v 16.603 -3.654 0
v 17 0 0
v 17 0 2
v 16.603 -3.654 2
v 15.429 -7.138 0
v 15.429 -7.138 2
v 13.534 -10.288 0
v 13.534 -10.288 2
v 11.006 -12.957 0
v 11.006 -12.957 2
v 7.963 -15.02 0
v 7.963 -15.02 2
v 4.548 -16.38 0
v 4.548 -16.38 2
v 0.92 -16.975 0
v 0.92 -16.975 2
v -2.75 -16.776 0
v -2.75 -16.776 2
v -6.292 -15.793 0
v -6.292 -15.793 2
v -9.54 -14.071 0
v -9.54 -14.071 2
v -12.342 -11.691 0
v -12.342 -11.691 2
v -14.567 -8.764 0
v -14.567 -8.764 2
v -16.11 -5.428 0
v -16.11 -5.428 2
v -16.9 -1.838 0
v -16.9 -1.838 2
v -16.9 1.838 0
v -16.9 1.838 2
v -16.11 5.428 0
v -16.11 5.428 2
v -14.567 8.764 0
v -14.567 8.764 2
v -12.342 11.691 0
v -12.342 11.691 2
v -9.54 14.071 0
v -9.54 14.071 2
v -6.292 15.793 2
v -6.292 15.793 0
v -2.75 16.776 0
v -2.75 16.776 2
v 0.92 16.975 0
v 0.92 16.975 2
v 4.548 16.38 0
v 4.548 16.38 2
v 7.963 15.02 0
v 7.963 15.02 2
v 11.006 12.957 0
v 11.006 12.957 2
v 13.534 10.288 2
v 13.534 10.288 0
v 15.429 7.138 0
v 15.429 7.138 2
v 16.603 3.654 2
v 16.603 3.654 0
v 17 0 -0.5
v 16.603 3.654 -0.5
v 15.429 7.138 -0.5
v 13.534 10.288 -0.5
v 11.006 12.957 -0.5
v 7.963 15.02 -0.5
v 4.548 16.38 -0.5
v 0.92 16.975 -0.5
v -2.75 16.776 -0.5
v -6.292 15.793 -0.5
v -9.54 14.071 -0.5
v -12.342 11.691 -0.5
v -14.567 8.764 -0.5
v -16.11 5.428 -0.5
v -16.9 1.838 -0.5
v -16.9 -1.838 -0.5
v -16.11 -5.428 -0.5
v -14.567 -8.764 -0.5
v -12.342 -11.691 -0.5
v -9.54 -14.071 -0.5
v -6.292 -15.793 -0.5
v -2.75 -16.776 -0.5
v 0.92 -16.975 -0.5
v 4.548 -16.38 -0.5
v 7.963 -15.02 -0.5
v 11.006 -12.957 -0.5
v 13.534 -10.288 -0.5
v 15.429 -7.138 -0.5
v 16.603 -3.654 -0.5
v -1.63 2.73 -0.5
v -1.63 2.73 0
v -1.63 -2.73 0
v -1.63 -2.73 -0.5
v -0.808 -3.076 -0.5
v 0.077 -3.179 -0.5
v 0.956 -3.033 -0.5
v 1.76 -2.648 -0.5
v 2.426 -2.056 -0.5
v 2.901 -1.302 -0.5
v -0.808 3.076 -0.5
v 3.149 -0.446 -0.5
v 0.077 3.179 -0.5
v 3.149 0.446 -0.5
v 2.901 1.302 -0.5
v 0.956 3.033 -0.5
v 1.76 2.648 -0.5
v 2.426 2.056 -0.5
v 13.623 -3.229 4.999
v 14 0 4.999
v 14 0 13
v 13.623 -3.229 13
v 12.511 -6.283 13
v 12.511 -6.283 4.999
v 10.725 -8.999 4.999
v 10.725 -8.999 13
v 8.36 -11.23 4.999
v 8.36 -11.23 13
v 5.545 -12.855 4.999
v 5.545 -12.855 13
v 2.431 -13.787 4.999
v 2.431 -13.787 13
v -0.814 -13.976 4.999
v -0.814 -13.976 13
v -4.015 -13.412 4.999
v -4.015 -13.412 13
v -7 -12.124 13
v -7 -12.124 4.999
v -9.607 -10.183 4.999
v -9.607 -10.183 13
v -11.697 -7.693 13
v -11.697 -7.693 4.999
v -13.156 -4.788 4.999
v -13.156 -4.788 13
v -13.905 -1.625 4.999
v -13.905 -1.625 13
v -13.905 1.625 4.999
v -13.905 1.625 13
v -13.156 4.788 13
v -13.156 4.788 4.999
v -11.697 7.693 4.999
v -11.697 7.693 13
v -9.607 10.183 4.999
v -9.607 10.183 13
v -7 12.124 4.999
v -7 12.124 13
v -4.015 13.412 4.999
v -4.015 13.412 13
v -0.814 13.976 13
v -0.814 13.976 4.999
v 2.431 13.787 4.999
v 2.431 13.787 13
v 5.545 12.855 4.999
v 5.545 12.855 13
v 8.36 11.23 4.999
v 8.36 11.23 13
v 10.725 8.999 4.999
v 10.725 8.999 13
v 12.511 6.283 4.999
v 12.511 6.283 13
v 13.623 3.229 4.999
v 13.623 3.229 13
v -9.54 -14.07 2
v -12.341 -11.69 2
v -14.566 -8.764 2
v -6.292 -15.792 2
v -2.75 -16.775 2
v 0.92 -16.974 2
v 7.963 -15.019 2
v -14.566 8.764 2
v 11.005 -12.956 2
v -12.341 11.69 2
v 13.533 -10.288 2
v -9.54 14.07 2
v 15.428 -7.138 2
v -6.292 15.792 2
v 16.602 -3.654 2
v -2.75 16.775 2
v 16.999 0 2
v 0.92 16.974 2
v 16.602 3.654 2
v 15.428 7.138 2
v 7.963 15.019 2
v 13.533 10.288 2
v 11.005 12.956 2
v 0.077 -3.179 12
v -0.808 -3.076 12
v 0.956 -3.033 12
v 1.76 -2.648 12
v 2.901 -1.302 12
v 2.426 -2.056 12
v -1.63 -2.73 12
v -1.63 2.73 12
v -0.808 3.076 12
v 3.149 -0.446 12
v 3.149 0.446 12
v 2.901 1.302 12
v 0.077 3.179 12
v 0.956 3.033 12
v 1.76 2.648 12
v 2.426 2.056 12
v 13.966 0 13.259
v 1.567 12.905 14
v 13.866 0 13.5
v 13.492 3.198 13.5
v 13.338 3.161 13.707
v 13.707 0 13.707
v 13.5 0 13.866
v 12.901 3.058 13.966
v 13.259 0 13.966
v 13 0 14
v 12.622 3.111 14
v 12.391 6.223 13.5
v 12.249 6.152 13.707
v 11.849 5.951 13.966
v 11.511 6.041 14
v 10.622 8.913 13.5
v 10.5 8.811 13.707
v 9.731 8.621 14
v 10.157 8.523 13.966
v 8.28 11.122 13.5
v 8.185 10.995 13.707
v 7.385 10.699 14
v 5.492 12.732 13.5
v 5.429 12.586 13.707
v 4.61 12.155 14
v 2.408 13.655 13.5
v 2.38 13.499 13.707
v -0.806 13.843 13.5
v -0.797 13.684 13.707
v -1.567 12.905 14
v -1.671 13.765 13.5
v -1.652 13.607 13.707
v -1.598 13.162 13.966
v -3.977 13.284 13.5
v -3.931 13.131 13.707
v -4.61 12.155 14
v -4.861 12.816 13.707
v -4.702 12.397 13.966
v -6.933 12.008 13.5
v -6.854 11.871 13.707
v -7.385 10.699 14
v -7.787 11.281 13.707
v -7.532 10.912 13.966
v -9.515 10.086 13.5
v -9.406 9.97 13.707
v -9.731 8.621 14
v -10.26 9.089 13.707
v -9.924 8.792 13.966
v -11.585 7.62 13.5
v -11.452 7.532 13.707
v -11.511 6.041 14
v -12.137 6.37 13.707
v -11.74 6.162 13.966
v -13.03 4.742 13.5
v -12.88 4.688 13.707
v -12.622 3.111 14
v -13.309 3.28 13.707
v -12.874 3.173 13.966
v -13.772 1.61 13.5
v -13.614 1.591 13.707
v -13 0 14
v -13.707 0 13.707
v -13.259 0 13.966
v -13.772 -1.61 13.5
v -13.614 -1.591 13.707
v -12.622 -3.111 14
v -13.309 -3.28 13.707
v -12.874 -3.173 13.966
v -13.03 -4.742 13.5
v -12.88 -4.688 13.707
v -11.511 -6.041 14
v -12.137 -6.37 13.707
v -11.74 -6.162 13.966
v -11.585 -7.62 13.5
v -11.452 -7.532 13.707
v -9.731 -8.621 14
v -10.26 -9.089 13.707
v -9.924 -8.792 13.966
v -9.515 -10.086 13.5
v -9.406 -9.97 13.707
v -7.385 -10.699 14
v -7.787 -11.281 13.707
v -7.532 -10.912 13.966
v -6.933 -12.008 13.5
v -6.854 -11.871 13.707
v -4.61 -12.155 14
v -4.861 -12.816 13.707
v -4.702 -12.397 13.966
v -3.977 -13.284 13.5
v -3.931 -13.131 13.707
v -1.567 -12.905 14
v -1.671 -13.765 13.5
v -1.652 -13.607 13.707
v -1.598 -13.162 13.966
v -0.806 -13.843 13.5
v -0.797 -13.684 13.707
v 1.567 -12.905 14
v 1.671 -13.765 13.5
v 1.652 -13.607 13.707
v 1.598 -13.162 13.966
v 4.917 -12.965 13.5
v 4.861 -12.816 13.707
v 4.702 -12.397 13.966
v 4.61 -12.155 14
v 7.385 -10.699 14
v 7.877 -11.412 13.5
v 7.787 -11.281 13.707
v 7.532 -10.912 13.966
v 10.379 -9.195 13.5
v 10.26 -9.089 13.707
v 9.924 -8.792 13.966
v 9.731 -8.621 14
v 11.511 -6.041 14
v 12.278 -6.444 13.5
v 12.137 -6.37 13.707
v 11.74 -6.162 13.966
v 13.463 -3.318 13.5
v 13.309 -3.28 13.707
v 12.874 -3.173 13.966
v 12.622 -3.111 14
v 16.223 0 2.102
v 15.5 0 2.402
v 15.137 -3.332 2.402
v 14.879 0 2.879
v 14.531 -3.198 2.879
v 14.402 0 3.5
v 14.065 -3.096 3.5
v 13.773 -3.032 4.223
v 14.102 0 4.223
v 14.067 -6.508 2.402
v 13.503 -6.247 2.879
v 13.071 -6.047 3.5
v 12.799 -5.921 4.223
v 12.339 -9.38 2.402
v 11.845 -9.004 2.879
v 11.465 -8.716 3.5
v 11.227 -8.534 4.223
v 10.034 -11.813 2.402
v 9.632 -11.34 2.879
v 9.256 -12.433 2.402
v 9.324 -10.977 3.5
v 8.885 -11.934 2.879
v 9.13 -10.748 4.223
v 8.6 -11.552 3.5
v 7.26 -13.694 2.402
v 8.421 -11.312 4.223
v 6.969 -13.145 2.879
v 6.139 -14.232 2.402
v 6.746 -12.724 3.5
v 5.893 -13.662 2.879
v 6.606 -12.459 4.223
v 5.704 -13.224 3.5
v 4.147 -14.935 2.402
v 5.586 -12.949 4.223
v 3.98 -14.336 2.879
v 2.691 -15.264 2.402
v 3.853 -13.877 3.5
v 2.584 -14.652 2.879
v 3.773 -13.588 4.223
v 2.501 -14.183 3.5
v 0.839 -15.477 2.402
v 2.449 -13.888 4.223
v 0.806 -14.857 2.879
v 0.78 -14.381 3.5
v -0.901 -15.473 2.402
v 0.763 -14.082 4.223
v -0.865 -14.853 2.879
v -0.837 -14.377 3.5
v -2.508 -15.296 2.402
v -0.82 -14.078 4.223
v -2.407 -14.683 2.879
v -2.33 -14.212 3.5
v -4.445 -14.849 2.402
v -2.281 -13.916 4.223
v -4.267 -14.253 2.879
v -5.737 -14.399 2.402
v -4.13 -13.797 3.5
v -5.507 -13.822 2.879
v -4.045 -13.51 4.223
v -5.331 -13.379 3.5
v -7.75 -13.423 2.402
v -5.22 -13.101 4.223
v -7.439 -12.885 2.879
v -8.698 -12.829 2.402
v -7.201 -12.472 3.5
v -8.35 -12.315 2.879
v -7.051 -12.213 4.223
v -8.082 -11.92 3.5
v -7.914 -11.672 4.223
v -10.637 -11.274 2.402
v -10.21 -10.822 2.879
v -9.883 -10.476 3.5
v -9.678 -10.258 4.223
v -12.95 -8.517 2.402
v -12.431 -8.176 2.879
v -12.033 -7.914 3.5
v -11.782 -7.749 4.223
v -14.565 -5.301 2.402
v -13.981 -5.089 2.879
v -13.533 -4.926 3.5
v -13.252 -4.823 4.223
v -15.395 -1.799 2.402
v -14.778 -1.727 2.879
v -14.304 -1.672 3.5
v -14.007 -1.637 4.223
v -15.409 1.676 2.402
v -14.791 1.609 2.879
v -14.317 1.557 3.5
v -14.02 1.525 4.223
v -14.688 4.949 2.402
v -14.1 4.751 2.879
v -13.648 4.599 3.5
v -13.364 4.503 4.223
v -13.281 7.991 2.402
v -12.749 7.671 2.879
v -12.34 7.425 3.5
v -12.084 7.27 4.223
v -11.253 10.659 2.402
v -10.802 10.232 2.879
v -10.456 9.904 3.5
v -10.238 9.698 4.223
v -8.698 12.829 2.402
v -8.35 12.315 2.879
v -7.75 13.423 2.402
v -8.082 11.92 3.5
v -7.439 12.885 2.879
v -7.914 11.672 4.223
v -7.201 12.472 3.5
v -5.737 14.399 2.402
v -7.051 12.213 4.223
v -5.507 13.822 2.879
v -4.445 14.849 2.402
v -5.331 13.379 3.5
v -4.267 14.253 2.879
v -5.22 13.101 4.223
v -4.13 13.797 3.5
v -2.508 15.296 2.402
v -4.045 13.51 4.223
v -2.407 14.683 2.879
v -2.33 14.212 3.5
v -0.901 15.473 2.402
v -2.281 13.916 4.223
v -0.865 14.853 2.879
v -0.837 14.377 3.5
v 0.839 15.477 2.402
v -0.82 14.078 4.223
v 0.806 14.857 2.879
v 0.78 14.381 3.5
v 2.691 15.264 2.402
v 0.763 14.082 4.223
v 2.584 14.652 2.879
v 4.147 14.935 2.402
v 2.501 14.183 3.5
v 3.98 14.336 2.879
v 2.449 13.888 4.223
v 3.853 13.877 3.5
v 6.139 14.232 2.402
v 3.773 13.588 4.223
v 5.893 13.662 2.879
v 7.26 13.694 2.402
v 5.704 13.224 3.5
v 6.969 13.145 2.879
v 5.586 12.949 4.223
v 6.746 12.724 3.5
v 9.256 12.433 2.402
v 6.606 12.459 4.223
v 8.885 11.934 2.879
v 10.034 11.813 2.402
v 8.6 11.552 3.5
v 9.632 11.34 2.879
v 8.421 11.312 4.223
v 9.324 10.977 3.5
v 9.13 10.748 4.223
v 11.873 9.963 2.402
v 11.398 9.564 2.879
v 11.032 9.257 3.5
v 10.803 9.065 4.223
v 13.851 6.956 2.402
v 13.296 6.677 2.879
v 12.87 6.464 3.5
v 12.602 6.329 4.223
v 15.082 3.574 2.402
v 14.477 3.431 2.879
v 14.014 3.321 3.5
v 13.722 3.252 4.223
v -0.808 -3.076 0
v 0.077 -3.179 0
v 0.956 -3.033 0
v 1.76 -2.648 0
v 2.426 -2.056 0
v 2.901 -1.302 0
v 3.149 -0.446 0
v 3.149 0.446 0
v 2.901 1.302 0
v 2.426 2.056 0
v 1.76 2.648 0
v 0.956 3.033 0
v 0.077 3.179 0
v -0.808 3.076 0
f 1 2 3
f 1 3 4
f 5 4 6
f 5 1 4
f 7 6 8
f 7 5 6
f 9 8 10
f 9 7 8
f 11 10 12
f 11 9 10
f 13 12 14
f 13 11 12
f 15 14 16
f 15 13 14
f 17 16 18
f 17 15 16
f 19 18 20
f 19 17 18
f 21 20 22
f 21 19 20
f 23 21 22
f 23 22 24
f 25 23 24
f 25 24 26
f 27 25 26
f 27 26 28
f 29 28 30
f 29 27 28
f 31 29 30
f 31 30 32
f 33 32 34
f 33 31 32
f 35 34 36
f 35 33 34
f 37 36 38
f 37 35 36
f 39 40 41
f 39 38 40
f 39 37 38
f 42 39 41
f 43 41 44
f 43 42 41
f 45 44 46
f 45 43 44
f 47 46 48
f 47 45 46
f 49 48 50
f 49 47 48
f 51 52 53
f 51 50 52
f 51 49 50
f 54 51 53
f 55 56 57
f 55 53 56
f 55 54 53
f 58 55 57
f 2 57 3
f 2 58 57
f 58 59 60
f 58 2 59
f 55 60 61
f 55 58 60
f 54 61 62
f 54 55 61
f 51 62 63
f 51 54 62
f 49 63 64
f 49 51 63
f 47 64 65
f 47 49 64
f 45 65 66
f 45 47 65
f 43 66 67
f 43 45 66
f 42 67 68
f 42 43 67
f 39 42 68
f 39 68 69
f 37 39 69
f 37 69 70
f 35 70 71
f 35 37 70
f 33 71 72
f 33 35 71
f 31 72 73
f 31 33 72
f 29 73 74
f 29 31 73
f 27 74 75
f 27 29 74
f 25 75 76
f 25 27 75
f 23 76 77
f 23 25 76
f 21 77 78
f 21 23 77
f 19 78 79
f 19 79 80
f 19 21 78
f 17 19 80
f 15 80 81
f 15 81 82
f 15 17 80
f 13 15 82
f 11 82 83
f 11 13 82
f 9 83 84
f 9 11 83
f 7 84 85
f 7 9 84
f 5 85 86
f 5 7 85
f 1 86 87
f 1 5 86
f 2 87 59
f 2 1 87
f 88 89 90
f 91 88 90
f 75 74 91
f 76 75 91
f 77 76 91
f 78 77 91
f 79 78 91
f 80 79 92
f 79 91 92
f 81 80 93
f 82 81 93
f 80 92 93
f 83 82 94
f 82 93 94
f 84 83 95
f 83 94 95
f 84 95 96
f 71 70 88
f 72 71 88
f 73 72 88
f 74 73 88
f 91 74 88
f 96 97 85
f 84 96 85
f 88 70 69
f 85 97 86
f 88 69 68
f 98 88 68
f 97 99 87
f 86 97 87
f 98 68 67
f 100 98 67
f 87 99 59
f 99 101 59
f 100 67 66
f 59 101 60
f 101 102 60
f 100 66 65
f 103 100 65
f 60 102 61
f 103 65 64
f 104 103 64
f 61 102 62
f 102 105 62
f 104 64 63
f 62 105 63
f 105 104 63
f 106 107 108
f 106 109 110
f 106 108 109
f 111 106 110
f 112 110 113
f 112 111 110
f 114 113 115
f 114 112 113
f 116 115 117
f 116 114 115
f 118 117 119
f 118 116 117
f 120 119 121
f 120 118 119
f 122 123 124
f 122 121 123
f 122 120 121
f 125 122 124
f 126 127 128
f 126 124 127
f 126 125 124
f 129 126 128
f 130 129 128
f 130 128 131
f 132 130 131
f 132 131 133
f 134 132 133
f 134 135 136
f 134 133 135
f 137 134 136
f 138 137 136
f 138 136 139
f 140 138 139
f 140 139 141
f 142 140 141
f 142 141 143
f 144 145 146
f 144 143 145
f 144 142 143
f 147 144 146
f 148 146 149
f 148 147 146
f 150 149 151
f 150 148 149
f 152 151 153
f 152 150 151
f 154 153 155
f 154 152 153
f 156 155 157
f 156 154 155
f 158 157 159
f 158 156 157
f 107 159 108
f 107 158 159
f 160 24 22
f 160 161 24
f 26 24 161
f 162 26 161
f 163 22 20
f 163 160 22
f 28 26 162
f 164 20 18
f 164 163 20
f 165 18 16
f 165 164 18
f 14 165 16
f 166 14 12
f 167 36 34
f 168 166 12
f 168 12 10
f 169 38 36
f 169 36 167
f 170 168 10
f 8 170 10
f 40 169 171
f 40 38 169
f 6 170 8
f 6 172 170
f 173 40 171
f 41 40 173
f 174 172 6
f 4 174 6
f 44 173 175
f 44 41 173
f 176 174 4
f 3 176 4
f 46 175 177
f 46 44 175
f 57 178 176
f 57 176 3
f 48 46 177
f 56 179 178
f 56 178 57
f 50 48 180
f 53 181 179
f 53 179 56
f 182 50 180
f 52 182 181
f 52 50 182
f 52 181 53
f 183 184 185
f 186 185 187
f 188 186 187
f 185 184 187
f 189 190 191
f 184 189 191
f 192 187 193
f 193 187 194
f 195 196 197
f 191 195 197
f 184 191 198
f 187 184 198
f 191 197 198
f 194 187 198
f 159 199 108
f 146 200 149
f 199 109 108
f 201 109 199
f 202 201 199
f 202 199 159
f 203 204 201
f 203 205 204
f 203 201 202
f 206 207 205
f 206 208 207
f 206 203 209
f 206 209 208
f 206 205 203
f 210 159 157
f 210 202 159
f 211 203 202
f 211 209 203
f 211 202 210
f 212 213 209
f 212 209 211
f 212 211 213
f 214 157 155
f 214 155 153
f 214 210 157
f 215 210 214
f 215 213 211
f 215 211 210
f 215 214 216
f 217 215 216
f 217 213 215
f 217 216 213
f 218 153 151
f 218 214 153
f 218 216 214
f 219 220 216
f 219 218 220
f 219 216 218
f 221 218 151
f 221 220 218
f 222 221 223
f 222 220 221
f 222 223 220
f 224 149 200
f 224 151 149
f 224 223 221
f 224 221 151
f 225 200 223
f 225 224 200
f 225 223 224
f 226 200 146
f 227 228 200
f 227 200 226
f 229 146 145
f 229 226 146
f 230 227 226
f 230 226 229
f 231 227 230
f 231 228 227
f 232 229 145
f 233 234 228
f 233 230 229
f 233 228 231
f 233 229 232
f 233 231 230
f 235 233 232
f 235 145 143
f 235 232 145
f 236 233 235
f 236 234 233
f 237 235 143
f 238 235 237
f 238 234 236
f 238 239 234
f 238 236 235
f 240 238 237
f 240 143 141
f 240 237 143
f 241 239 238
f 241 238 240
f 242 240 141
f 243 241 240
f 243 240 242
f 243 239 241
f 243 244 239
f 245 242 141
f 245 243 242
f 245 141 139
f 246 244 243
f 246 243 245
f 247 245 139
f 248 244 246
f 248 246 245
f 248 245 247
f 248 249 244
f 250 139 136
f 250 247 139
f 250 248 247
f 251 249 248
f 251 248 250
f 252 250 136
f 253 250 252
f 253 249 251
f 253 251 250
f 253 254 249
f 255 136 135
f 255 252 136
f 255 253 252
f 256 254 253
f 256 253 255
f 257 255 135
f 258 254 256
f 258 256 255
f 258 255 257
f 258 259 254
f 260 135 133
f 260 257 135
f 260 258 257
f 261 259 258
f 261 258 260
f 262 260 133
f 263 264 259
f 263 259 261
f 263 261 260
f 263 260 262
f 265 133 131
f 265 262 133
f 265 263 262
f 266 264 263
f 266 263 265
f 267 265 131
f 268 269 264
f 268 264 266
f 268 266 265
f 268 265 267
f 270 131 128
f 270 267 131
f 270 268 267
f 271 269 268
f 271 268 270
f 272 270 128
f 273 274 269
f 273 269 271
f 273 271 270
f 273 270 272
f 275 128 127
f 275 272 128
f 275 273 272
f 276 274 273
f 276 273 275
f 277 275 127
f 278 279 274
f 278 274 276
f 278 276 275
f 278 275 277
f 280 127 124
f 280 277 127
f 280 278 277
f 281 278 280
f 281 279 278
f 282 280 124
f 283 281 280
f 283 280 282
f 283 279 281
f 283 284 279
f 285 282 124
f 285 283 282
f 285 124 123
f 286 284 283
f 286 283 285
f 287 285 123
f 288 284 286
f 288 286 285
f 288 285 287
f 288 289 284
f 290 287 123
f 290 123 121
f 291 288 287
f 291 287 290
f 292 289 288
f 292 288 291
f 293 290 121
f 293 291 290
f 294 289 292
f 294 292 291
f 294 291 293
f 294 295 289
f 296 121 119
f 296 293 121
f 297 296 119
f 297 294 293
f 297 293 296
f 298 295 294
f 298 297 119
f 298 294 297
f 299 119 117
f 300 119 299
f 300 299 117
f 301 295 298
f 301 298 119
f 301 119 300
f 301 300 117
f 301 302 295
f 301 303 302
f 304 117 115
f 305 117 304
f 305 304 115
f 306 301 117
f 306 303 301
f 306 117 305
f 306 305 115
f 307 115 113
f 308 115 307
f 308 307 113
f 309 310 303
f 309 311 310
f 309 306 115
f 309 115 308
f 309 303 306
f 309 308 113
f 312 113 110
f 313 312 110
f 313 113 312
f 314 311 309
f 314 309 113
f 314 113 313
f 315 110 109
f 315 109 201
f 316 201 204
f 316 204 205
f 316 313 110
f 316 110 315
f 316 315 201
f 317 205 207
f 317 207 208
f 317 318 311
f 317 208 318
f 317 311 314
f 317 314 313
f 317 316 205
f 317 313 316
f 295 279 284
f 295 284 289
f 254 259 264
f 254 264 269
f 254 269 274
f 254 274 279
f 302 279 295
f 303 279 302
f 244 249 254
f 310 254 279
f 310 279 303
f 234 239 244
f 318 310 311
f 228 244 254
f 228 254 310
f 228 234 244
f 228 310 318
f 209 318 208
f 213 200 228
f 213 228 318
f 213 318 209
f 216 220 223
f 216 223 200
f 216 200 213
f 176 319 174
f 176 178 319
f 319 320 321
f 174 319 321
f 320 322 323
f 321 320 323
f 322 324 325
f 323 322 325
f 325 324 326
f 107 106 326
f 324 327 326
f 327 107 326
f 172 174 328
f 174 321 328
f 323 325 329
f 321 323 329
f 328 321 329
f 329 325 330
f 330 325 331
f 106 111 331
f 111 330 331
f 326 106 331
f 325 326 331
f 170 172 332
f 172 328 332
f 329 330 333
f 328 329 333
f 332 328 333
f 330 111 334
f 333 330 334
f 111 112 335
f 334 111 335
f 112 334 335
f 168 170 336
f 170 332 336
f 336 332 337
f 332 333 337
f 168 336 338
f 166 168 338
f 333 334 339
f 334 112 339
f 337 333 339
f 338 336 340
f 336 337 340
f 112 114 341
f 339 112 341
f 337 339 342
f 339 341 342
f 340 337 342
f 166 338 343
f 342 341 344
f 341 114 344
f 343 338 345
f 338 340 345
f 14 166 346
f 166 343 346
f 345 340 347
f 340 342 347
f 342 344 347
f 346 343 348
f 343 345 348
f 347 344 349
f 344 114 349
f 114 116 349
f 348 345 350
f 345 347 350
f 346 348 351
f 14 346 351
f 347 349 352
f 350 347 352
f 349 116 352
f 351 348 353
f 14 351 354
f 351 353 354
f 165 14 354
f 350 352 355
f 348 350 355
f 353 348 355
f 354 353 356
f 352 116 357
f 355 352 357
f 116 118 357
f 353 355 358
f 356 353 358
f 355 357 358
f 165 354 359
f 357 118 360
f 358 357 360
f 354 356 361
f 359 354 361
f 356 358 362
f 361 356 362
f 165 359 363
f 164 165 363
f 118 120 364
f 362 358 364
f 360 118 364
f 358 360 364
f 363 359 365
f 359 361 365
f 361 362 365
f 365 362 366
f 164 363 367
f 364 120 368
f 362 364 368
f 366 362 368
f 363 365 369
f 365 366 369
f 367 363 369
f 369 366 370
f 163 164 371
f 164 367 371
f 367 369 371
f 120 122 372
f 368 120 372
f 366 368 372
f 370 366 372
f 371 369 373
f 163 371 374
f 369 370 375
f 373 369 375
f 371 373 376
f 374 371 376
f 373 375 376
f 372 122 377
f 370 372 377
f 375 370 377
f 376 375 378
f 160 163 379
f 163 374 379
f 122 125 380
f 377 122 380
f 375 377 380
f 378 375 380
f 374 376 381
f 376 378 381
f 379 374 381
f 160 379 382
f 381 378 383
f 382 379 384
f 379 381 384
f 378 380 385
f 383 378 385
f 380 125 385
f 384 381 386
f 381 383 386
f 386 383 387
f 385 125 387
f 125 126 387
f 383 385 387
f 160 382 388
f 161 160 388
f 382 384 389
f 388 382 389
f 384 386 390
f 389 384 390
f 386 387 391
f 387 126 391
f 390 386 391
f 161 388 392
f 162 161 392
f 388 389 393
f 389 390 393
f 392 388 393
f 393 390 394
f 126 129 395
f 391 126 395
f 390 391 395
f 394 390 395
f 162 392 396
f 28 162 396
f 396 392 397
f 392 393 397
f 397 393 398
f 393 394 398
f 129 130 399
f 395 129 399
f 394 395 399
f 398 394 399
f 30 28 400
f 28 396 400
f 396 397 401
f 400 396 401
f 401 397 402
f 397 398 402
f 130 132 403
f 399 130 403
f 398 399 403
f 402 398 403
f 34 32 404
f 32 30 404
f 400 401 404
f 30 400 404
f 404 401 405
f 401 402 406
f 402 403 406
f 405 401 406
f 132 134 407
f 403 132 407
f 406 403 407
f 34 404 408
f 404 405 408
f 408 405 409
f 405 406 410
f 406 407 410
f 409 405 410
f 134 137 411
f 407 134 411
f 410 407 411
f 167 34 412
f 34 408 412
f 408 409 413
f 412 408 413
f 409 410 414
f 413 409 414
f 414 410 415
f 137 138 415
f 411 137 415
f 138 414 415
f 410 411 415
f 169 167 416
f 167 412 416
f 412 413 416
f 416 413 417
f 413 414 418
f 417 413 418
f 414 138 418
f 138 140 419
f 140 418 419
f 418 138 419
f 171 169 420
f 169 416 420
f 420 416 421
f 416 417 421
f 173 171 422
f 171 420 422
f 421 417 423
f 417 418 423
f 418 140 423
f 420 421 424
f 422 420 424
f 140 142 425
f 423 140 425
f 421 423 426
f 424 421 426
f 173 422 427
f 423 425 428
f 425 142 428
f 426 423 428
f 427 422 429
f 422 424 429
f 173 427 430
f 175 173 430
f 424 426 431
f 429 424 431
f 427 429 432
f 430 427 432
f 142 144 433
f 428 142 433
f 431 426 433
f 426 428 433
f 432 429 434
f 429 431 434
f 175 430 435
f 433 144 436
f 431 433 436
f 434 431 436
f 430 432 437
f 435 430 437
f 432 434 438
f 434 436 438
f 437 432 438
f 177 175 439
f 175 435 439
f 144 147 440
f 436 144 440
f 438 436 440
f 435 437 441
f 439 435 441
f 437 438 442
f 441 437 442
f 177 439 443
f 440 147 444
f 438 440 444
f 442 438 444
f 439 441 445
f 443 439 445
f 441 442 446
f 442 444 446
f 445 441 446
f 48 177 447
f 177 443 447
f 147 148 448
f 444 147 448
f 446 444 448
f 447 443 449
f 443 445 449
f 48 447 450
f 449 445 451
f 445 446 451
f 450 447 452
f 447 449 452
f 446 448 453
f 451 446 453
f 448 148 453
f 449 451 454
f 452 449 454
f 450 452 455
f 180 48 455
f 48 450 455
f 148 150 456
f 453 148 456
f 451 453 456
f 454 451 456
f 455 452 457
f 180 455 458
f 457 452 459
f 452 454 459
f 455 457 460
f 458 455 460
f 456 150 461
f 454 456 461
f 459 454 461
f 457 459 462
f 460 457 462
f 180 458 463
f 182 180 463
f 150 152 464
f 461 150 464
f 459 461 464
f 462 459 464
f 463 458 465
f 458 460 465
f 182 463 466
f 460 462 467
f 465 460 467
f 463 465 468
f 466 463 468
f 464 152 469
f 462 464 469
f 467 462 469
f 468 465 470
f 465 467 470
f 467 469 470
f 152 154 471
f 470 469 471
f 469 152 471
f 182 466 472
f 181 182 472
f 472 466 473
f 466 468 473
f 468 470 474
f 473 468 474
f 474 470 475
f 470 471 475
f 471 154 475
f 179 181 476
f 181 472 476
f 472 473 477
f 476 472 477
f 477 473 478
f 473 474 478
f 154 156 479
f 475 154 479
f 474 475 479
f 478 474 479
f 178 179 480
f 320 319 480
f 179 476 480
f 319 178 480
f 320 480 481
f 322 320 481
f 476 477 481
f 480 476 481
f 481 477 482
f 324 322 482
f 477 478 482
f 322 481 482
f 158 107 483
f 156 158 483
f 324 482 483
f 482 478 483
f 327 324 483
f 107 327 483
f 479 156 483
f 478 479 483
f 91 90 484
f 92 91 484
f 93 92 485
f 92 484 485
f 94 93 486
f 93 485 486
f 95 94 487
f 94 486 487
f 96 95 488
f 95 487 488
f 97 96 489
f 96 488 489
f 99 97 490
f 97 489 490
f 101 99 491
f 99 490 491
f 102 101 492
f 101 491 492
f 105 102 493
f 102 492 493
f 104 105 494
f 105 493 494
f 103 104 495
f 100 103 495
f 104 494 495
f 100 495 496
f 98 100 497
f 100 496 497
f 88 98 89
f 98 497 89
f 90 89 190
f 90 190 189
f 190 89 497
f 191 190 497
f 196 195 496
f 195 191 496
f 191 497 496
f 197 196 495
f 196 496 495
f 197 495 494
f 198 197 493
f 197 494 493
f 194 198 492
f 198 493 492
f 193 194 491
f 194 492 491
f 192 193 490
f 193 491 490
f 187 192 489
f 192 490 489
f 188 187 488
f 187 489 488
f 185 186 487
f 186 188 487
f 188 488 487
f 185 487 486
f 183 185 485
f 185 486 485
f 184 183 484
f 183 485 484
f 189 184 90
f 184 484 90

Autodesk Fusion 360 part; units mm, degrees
sketch "Sketch1" plane through (0, 0, 0) normal (0, 0, 1) x (1, 0, 0)
  line L0 (-1.45, 2.6263) -> (-1.45, -2.6263) construction
  arc A0 (-1.45, -2.6263) -> (-1.45, 2.6263) centre (0, 0) ccw construction
  arc A1 (-1.63, -2.7305) -> (-1.63, 2.7305) centre (0, 0) ccw
  line L1 (-1.63, 2.7305) -> (-1.63, -2.7305)
  circle A2 centre (0, 0) radius 17
  circle A3 centre (0, 0) radius 14
  dimension "d1" = 6
  dimension "d4" = 0.18
  dimension "d5" = 34
  dimension "d6" = 3
extrude "Extrude1" add sketch "Sketch1" along normal blind 14 contours A1 L1 | A3
extrude "Extrude2" add sketch "Sketch1" along normal blind 2 contours A2
extrude "Extrude3" cut sketch "Sketch1" along normal blind 12 contours A1 L1
fillet "Fillet1" radius 3 1 edges at (-13.0526, -5.0626, 2)
fillet "Fillet2" radius 1 1 edges at (-13.0526, -5.0626, 14)
extrude "Extrude4" add sketch "Sketch1" along normal blind 2 contours A2
extrude "Extrude5" add sketch "Sketch1" against normal blind 0.5 contours A2 | A3
equation "mountTol = 0.18 mm"
equation "d4 = mountTol"
